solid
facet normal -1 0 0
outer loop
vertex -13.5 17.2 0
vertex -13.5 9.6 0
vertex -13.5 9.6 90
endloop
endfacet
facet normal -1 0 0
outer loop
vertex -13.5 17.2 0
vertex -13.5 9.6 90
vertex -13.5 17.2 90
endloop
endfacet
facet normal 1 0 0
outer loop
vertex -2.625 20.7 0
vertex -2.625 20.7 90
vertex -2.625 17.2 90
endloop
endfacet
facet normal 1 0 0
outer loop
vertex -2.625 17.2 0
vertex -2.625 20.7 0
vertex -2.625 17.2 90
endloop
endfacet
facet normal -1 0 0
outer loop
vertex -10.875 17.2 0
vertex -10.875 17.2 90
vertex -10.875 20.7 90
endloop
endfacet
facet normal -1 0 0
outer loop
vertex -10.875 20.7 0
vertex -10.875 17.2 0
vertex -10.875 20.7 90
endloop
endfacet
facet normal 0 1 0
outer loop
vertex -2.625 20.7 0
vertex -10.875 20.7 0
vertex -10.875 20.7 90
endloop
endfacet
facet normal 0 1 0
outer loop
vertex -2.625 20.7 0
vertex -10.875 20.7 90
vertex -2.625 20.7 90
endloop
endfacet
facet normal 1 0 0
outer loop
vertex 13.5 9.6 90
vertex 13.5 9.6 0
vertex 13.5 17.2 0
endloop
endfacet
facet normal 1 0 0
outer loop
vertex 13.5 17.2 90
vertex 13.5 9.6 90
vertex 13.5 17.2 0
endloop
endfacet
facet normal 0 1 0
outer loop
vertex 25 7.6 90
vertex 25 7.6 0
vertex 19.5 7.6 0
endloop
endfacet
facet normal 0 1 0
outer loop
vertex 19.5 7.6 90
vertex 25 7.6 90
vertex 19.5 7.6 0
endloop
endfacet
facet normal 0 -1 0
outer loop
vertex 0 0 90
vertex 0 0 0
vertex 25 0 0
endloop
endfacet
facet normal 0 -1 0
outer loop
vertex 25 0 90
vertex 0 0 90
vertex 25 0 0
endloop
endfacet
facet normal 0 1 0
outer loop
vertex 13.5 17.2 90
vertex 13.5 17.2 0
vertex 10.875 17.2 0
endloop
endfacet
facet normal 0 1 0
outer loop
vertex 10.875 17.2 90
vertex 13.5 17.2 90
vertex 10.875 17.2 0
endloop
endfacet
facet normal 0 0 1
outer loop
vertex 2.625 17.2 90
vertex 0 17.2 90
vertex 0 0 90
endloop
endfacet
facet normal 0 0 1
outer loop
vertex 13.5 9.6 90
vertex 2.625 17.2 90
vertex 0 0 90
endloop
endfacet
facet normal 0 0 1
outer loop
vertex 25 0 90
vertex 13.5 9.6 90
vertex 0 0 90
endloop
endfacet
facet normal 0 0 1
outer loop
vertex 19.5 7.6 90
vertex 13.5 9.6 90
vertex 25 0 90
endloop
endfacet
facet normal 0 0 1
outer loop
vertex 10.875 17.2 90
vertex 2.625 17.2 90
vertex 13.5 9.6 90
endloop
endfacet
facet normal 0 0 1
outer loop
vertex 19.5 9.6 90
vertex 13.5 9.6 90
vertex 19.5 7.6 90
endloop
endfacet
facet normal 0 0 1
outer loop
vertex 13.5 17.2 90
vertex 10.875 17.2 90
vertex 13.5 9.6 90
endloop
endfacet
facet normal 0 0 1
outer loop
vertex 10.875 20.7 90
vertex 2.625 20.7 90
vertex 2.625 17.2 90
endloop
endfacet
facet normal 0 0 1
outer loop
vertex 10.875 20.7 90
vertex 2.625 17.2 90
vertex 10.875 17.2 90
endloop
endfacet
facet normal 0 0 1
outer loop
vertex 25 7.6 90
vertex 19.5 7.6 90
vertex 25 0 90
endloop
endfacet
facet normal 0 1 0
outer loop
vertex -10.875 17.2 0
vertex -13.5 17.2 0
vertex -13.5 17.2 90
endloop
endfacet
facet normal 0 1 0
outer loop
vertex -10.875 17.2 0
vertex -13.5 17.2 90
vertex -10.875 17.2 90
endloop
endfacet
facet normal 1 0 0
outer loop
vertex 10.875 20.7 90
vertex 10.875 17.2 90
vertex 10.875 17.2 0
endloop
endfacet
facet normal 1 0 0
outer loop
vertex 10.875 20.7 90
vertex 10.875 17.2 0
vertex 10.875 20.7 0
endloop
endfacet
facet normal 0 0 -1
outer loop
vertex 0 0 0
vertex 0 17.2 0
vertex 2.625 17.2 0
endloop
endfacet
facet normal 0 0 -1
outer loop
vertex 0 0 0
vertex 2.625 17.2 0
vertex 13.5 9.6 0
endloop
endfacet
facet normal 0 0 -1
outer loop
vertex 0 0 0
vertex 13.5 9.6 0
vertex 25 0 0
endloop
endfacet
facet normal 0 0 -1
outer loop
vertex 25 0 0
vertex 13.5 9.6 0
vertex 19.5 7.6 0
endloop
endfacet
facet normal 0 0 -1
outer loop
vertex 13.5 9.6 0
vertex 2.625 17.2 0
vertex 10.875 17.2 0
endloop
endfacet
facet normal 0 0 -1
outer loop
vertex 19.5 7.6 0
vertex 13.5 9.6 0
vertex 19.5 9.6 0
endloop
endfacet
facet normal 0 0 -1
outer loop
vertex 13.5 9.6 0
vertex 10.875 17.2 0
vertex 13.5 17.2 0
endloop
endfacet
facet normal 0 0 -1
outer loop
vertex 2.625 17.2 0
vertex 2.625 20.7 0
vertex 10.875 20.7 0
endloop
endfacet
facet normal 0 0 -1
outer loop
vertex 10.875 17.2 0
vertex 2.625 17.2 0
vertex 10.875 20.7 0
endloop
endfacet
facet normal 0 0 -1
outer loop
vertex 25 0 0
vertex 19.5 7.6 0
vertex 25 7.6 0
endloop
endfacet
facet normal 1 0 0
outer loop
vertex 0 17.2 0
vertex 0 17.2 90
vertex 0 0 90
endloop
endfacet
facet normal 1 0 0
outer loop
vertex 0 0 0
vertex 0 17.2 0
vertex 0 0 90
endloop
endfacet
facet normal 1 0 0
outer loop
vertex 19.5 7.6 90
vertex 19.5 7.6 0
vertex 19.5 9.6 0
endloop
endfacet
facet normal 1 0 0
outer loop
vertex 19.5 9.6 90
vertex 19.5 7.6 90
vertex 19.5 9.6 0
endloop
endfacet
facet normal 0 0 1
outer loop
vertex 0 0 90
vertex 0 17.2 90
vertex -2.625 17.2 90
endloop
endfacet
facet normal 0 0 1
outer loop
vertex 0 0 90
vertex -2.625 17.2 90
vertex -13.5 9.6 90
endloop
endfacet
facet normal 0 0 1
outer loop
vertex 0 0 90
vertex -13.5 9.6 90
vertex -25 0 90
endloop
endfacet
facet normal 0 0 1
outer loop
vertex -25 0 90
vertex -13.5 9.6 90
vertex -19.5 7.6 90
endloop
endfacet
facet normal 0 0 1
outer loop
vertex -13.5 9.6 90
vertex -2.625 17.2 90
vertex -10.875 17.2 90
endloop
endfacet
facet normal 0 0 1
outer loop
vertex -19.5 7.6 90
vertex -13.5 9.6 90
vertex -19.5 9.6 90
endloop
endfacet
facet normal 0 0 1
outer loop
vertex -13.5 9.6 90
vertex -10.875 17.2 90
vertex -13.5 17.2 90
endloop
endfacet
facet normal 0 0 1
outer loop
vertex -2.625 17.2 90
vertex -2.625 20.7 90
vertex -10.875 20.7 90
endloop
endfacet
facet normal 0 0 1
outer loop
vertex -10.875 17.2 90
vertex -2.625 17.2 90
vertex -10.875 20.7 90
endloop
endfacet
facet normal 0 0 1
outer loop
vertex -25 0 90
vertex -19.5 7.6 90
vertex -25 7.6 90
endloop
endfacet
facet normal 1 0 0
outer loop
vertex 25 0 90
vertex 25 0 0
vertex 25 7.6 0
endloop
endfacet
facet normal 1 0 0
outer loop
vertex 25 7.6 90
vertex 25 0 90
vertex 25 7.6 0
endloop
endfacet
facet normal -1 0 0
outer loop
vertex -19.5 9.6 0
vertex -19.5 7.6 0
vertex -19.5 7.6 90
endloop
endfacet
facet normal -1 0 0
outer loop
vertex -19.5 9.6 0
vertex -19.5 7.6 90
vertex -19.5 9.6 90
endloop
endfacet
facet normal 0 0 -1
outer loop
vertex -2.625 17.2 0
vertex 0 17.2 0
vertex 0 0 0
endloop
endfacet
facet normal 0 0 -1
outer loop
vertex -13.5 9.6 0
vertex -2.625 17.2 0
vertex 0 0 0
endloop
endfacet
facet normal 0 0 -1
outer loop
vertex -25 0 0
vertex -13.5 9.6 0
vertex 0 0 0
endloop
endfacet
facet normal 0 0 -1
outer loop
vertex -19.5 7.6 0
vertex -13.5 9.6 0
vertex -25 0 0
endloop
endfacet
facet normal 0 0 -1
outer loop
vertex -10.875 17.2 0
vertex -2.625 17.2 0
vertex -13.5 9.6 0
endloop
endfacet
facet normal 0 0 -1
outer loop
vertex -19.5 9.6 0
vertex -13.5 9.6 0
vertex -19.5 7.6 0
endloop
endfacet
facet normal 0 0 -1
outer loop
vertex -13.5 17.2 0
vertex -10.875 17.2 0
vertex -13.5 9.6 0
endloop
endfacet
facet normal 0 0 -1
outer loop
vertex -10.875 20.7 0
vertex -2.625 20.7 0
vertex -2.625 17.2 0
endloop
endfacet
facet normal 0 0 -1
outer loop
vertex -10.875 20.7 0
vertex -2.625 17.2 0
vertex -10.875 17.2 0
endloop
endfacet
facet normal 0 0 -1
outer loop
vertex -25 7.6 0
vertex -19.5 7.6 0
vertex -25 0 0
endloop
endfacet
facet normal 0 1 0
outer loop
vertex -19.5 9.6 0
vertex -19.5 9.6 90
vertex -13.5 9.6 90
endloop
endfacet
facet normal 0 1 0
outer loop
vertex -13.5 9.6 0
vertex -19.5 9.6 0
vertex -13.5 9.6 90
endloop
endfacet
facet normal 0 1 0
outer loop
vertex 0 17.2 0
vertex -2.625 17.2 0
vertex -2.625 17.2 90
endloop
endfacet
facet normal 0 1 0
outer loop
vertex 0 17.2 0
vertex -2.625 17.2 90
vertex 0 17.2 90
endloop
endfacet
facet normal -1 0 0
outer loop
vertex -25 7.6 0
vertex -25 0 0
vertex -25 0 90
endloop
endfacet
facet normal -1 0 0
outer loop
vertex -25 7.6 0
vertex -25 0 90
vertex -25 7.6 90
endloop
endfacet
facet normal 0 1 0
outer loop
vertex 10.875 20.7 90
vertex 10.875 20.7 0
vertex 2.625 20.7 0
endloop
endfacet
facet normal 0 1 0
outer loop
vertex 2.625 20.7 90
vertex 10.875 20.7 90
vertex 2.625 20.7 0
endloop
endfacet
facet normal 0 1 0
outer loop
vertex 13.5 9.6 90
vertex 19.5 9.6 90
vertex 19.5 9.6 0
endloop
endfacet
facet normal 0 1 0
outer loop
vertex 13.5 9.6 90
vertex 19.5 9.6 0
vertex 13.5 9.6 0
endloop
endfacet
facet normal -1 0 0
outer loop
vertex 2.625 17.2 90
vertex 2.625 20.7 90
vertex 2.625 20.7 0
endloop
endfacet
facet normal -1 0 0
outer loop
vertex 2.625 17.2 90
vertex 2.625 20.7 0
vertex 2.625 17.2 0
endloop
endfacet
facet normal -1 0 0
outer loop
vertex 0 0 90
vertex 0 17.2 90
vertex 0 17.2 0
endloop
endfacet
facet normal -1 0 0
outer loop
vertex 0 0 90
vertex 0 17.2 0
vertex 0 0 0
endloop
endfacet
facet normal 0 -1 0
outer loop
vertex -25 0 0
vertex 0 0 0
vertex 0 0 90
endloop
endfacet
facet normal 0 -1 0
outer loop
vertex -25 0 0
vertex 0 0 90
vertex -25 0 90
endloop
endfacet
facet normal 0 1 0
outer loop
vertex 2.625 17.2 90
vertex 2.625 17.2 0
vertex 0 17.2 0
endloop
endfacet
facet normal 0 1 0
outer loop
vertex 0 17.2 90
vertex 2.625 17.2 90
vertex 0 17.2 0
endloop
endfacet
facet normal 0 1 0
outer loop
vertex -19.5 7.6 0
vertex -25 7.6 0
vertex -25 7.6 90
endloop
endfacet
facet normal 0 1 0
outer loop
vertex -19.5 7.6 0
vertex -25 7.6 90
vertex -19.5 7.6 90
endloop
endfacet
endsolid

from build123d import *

# Parameters (mm, degrees)
BOSS_EXTRUDE1_DEPTH = 90


with BuildPart() as part:
    # Sketch1 → Boss-Extrude1 (new body)
    with BuildSketch(Plane.XY):
        Polygon((-25, 0), (-25, 7.6), (-19.5, 7.6), (-19.5, 9.6), (-13.5, 9.6), (-13.5, 17.2), (-10.875, 17.2), (-10.875, 20.7), (-2.625, 20.7), (-2.625, 17.2), (0, 17.2), (0, 0), align=None)
    extrude(amount=BOSS_EXTRUDE1_DEPTH)


with BuildPart() as body_2:
    # Mirror1: mirrored copy
    add(part.part.mirror(Plane(origin=(0, 17.2, 90), x_dir=(0, 0, 1), z_dir=(1, 0, 0))))


solid = Compound([part.part, body_2.part])
